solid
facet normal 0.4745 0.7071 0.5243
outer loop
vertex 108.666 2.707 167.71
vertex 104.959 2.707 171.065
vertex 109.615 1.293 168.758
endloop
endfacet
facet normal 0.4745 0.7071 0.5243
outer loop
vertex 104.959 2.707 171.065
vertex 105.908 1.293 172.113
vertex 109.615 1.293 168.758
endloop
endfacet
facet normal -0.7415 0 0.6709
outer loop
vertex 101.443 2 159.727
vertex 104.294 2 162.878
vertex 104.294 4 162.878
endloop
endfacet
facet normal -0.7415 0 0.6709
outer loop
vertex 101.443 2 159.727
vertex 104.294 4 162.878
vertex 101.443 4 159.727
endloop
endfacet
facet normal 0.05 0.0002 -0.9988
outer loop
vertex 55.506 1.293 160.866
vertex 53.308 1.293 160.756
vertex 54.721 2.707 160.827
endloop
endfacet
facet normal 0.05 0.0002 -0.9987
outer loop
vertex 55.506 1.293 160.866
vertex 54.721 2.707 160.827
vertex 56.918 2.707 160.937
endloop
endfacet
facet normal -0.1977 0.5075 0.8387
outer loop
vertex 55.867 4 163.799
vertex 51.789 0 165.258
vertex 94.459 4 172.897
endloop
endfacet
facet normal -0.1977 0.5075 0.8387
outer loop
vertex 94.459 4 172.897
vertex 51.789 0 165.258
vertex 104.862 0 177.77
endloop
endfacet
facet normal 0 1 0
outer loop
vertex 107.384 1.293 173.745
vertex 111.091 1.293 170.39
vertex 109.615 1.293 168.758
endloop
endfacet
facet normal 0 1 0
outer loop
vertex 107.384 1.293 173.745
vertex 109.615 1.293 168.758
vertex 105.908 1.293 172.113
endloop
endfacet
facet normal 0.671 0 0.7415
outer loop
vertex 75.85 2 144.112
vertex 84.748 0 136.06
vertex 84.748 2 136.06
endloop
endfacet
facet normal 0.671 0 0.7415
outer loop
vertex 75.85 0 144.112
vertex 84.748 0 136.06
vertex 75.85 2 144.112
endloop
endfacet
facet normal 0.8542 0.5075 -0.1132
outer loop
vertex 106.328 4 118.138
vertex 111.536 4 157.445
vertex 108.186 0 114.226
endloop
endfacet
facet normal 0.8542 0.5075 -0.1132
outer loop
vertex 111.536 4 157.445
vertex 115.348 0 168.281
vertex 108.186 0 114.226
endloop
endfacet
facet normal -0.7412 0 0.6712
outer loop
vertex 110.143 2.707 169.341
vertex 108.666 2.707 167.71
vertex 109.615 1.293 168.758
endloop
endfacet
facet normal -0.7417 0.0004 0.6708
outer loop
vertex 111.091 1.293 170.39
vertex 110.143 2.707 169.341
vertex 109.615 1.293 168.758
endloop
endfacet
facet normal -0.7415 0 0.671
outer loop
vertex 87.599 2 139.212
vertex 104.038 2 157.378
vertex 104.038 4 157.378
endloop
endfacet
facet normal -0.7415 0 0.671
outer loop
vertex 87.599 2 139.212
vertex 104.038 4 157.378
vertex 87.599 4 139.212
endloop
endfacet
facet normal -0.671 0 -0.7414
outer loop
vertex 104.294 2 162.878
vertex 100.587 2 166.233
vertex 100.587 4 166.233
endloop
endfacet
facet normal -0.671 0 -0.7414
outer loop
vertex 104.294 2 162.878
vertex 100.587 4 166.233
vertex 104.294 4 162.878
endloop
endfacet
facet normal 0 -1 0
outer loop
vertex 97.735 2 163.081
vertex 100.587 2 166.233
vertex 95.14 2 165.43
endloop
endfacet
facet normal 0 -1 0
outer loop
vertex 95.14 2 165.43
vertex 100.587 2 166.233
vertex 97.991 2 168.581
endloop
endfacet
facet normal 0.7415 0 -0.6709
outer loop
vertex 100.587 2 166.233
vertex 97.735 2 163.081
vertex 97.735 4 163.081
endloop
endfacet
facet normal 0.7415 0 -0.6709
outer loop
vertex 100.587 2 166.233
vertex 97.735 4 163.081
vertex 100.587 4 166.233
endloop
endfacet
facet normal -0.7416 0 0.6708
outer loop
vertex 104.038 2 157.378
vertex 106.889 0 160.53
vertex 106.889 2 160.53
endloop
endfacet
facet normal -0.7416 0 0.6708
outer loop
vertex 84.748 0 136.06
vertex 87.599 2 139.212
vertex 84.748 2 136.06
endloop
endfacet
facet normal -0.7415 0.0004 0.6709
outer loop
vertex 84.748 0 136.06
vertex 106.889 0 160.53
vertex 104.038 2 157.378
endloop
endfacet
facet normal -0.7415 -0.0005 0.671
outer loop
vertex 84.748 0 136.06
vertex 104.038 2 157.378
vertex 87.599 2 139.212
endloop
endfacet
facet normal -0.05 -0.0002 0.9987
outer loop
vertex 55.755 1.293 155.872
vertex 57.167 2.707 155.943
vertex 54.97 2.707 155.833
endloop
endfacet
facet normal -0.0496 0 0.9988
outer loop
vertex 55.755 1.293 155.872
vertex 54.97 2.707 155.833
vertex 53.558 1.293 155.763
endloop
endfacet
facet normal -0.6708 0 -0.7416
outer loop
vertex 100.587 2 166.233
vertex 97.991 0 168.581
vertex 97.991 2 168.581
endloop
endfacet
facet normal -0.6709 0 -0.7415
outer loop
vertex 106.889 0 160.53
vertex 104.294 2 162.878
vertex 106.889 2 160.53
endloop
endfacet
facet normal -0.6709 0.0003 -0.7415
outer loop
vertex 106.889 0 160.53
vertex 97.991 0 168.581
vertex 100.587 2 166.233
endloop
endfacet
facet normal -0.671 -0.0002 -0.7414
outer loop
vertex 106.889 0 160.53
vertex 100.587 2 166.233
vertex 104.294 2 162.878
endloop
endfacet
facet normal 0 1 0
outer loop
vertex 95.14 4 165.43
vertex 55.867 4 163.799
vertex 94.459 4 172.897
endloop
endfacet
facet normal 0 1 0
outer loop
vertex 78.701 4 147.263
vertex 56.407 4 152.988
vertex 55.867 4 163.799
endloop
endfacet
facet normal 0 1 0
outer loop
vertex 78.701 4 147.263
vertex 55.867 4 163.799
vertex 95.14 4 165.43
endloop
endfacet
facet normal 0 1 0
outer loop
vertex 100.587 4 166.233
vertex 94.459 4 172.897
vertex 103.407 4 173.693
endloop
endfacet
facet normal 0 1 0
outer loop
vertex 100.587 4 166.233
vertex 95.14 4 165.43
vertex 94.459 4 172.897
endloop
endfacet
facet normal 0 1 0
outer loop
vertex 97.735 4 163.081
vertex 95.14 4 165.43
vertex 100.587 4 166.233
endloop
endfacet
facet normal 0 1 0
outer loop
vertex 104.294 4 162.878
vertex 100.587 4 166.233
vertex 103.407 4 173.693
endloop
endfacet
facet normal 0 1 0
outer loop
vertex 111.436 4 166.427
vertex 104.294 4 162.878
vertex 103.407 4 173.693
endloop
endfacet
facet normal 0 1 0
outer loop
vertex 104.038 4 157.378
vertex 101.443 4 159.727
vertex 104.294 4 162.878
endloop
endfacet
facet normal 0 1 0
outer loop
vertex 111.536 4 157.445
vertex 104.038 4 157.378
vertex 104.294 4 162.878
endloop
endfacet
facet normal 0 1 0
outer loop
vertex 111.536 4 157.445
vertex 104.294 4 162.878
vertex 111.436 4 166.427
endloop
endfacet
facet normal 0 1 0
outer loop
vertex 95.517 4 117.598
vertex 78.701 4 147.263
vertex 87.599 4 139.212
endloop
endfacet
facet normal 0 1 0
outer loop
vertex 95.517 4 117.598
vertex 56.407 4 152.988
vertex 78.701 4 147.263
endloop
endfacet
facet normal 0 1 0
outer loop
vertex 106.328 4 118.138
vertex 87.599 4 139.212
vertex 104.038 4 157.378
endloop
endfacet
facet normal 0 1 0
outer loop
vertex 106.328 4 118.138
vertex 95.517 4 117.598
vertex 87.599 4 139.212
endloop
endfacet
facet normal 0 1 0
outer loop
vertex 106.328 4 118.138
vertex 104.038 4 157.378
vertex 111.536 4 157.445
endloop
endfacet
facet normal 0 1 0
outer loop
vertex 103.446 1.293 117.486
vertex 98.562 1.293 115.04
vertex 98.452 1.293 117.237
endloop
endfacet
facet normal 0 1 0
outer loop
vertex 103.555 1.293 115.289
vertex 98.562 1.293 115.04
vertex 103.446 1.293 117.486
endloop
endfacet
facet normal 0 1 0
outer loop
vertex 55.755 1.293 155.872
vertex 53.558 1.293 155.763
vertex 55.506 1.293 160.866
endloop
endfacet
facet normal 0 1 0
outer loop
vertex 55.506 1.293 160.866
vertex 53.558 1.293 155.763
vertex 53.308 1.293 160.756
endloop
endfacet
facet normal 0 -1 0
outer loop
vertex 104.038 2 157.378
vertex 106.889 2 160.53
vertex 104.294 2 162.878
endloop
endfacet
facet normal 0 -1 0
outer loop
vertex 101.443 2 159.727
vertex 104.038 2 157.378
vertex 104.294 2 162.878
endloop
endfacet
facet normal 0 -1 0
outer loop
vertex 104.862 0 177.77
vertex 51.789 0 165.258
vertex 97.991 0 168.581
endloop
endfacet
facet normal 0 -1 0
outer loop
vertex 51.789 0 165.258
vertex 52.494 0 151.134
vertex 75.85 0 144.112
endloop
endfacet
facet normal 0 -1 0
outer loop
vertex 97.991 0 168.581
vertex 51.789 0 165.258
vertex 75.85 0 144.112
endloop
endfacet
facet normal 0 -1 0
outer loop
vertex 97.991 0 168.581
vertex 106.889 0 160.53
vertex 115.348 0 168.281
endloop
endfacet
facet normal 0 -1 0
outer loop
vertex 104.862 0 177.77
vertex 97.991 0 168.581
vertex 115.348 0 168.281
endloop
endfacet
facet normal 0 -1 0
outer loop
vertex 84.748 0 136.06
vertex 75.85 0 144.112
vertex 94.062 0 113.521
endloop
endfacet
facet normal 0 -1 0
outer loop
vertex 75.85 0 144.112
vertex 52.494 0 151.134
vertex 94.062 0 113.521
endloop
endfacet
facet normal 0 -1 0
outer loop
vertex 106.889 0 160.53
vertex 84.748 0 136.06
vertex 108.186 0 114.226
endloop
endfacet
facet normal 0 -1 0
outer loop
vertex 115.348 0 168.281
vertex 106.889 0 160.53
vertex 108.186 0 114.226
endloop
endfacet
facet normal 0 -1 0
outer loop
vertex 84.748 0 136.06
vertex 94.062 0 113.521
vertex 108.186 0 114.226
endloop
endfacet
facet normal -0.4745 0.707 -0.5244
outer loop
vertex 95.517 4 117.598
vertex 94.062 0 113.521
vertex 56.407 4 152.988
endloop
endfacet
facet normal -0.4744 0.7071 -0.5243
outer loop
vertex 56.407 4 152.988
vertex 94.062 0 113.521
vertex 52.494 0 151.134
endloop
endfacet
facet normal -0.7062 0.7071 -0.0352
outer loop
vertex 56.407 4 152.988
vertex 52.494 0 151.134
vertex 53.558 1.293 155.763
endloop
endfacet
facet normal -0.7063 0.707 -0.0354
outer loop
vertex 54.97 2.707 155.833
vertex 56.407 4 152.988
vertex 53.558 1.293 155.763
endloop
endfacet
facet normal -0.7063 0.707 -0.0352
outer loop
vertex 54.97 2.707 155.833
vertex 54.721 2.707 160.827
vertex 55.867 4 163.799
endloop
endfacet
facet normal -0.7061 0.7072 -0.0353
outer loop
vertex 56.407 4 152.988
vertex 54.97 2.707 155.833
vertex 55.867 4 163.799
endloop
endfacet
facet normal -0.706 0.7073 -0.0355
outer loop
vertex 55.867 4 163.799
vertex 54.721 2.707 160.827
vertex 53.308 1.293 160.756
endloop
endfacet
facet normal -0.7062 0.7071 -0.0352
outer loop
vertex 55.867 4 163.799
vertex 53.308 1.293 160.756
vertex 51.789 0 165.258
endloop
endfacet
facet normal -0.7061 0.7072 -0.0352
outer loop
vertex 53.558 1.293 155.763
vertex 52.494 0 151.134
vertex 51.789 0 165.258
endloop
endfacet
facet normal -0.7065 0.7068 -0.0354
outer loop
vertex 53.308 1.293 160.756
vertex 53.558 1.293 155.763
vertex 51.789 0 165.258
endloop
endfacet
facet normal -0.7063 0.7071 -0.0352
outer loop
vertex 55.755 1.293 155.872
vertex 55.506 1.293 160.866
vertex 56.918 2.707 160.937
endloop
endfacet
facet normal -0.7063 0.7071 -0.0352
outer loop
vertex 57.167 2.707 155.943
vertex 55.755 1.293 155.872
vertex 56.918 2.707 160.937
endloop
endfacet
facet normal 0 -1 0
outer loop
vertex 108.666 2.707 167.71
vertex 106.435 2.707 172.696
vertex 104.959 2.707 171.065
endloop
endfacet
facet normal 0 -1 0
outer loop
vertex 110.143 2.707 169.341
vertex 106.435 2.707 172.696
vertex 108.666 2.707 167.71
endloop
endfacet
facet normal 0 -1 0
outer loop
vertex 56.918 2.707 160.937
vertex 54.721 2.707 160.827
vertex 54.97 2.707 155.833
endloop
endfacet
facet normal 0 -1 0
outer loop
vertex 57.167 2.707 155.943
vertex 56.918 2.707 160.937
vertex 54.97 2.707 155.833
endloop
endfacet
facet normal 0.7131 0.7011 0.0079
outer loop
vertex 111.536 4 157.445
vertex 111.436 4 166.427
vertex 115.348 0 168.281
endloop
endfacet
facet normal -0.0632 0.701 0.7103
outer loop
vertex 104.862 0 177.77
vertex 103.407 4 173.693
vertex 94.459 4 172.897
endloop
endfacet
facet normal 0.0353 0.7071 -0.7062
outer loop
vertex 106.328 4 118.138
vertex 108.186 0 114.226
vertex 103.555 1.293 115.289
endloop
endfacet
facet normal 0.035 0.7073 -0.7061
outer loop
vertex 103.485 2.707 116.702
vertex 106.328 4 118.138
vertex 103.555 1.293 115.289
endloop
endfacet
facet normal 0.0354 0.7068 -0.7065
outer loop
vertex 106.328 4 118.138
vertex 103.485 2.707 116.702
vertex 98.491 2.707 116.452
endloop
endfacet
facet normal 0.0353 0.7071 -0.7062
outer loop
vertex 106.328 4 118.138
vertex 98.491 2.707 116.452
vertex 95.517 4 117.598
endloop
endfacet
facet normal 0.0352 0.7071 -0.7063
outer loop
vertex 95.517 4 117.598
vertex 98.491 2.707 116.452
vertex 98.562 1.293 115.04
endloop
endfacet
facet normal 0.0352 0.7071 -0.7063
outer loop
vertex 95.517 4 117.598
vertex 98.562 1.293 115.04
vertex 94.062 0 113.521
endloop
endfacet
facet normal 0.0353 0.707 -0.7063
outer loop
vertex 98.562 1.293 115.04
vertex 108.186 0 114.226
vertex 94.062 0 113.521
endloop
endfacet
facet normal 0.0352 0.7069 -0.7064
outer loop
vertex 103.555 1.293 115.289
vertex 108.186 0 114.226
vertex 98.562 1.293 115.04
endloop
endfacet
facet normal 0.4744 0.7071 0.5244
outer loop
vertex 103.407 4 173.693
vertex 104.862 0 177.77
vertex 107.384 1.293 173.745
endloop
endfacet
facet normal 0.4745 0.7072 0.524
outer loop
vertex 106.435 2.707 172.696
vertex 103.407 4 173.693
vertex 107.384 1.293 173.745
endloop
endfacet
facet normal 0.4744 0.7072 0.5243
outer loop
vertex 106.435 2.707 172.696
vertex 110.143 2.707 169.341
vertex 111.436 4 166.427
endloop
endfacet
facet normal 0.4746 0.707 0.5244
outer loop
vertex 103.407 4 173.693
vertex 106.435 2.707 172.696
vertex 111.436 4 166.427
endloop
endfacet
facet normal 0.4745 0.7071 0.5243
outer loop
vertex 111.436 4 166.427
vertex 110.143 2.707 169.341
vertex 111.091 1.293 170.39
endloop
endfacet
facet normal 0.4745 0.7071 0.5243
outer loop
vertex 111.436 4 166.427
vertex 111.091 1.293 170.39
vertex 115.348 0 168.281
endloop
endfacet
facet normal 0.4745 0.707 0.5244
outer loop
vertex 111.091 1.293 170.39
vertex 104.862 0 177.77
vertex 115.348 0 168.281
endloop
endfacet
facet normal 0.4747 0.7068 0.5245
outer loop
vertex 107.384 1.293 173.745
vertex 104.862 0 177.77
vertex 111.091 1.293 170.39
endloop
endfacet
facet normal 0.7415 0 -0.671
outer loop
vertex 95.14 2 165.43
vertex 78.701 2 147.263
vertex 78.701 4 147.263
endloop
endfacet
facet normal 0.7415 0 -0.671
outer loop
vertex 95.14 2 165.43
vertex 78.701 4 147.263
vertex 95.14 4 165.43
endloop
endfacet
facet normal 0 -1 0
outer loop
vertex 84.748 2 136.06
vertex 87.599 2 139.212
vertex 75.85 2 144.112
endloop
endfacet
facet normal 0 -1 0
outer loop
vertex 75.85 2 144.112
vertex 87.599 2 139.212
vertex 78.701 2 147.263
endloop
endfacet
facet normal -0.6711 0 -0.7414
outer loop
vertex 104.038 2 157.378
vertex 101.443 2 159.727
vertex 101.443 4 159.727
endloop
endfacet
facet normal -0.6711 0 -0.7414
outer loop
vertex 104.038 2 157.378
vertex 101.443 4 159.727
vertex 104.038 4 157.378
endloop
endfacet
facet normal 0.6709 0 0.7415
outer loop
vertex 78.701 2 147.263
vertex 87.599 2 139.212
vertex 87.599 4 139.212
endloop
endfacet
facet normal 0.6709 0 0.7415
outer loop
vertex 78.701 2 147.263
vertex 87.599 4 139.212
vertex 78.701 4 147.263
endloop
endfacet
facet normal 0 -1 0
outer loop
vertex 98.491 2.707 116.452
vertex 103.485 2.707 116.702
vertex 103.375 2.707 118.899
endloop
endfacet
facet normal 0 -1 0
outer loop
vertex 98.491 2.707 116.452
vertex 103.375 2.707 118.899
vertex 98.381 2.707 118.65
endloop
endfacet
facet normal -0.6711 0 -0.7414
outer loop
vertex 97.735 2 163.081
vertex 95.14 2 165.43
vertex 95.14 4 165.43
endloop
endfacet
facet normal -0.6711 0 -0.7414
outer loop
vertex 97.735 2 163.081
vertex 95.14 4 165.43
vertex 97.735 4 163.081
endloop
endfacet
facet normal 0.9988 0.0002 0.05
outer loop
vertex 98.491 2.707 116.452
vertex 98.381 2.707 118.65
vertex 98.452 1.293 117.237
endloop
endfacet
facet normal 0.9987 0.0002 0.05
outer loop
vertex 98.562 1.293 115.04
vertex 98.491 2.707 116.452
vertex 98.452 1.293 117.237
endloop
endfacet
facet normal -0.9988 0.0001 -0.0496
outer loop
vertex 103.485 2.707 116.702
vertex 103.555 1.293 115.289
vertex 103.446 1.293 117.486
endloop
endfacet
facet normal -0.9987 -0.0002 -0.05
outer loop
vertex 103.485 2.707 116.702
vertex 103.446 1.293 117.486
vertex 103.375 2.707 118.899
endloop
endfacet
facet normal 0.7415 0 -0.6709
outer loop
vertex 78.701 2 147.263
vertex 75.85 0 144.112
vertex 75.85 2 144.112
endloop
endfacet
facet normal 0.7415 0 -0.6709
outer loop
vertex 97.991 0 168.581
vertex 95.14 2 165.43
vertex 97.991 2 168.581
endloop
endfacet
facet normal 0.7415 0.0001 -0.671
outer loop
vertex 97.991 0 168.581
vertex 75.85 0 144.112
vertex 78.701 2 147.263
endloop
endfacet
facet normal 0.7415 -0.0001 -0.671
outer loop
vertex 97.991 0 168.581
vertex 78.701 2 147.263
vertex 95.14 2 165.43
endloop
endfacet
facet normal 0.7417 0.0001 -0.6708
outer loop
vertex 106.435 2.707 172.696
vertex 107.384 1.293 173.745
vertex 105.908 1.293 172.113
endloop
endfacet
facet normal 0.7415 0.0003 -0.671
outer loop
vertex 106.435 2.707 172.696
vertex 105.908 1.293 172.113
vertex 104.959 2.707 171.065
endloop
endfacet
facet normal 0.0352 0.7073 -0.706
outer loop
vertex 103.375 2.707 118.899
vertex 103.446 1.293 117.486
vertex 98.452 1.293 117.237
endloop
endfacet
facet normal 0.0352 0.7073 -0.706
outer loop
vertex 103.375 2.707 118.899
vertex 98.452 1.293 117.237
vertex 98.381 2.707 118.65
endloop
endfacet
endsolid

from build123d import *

# Parameters (mm, degrees)
BOSS_EXTRUDE1_DEPTH = 4
DRAFT1_ANGLE        = -45
DRAFT2_ANGLE        = -30.5
CUT_EXTRUDE5_DEPTH  = 2
CUT_EXTRUDE6_DEPTH  = 212.923325802
CUT_EXTRUDE9_DEPTH  = 2.2
CUT_EXTRUDE7_DEPTH  = 8.686291501
CUT_EXTRUDE8_DEPTH  = 8.686291501
CUT_EXTRUDE10_DEPTH = 2.2


with BuildPart() as part:
    # Sketch1 → Boss-Extrude1 (new body)
    with BuildSketch(Plane(origin=(0, 0, 0), x_dir=(1, 0, 0), z_dir=(0, 1, 0))):
        Polygon((52.494351143, -151.133854852), (51.789004581, -165.258389755), (104.862009772, -177.770248363), (115.348319519, -168.281449289), (108.186209242, -114.225971655), (94.061674339, -113.520625094), align=None)
    extrude(amount=BOSS_EXTRUDE1_DEPTH)

    # Draft1
    draft1_faces = [part.faces().sort_by_distance(p)[0] for p in [
        (73.278012741, 2, 132.327239973),
        (110.105164645, 2, 173.025848826),
        (52.141677862, 2, 158.196122303),
        (101.12394179, 2, 113.873298375),
    ]]
    draft(draft1_faces, Plane(origin=(0, 0, 0), x_dir=(0, 0, -1), z_dir=(0, -1, 0)), DRAFT1_ANGLE)

    # Draft2
    draft2_faces = [part.faces().sort_by_distance(p)[0] for p in [
        (78.138469796, 1.940570555, 171.470225357),
        (111.74202401, 1.940570555, 141.063210709),
    ]]
    draft(draft2_faces, Plane(origin=(0, 0, 0), x_dir=(0, 0, -1), z_dir=(0, -1, 0)), DRAFT2_ANGLE)

    # Sketch2 → Cut-Extrude5 (cut)
    with BuildSketch(Plane.XZ):
        Polygon((75.849733352, 144.111731538), (97.991394115, 168.581035955), (106.889322994, 160.52952295), (84.747662231, 136.060218533), align=None)
    extrude(amount=-CUT_EXTRUDE5_DEPTH, mode=Mode.SUBTRACT)

    # Sketch3 → Cut-Extrude6 (cut, through all)
    with BuildSketch(Plane.XZ.offset(-2)):
        Polygon((95.139816593, 165.429686144), (97.735045849, 163.081328184), (100.586623371, 166.232677995), (104.294093738, 162.87788091), (101.442516215, 159.726531099), (104.037745471, 157.378173139), (87.599239753, 139.211568345), (78.701310874, 147.263081349), align=None)
    extrude(amount=-CUT_EXTRUDE6_DEPTH, mode=Mode.SUBTRACT)

    # Sketch7 → Cut-Extrude9 (cut, along a direction that is not the sketch's normal)
    with BuildSketch(Plane(origin=(67.825186868, 101.086869254, 74.955314434), x_dir=(-0.5807891989379262, -0.19614622185114675, 0.7900699754139267), z_dir=(0.4744399537114777, 0.7071067811865489, 0.5243154873949929))):
        Polygon((74.094551817, 123.420131254), (69.290768622, 124.80709449), (69.845553917, 126.728607768), (74.649337111, 125.341644532), align=None)
    extrude(amount=-CUT_EXTRUDE9_DEPTH, dir=(0.6709594170704366, 0, 0.7414940732362599), mode=Mode.SUBTRACT)

    # Sketch4 → Cut-Extrude7 (cut, along a direction that is not the sketch's normal)
    with BuildSketch(Plane(origin=(0, 4, 0), x_dir=(1, 0, 0), z_dir=(0, 1, 0))):
        Polygon((112.587766826, -165.384890501), (111.435934245, -166.427154957), (111.53570927, -157.444566839), align=None)
    extrude(amount=-CUT_EXTRUDE7_DEPTH, dir=(-0.6637345426247422, 0.6785983445458476, -0.3145802659200979), mode=Mode.SUBTRACT)

    # Sketch6 → Cut-Extrude8 (cut, along a direction that is not the sketch's normal)
    with BuildSketch(Plane(origin=(0, 4, 0), x_dir=(1, 0, 0), z_dir=(0, 1, 0))):
        Polygon((102.254887128, -174.734854565), (103.406719709, -173.692590108), (94.458880925, -172.896961139), align=None)
    extrude(amount=-CUT_EXTRUDE8_DEPTH, dir=(-0.24688935673809265, 0.6785983445458336, -0.6917730352573054), mode=Mode.SUBTRACT)

    # Sketch8 → Cut-Extrude10 (cut, along a direction that is not the sketch's normal)
    with BuildSketch(Plane(origin=(29.94613408, -29.98345025, 1.495440583), x_dir=(0.7079857233236485, 0.7053499867326429, -0.03517970702195721), z_dir=(-0.7062267451533468, 0.7071067811865487, -0.03526732808291803))):
        Polygon((34.993140865, -160.762185663), (35.345376313, -155.774608076), (33.350345278, -155.633713897), (32.99810983, -160.621291484), align=None)
    cut_extrude10 = extrude(amount=-CUT_EXTRUDE10_DEPTH, dir=(-0.9987554411064721, 0, -0.04987553368352402), mode=Mode.SUBTRACT)

    # Mirror1: Cut-Extrude10 across plane
    add(cut_extrude10.mirror(Plane(origin=(-25.545209091, 0, 23.115219958), x_dir=(0.6709594170704504, 0, 0.7414940732362473), z_dir=(-0.7414940732362473, 0, 0.6709594170704505))), mode=Mode.SUBTRACT)


solid = part.part
